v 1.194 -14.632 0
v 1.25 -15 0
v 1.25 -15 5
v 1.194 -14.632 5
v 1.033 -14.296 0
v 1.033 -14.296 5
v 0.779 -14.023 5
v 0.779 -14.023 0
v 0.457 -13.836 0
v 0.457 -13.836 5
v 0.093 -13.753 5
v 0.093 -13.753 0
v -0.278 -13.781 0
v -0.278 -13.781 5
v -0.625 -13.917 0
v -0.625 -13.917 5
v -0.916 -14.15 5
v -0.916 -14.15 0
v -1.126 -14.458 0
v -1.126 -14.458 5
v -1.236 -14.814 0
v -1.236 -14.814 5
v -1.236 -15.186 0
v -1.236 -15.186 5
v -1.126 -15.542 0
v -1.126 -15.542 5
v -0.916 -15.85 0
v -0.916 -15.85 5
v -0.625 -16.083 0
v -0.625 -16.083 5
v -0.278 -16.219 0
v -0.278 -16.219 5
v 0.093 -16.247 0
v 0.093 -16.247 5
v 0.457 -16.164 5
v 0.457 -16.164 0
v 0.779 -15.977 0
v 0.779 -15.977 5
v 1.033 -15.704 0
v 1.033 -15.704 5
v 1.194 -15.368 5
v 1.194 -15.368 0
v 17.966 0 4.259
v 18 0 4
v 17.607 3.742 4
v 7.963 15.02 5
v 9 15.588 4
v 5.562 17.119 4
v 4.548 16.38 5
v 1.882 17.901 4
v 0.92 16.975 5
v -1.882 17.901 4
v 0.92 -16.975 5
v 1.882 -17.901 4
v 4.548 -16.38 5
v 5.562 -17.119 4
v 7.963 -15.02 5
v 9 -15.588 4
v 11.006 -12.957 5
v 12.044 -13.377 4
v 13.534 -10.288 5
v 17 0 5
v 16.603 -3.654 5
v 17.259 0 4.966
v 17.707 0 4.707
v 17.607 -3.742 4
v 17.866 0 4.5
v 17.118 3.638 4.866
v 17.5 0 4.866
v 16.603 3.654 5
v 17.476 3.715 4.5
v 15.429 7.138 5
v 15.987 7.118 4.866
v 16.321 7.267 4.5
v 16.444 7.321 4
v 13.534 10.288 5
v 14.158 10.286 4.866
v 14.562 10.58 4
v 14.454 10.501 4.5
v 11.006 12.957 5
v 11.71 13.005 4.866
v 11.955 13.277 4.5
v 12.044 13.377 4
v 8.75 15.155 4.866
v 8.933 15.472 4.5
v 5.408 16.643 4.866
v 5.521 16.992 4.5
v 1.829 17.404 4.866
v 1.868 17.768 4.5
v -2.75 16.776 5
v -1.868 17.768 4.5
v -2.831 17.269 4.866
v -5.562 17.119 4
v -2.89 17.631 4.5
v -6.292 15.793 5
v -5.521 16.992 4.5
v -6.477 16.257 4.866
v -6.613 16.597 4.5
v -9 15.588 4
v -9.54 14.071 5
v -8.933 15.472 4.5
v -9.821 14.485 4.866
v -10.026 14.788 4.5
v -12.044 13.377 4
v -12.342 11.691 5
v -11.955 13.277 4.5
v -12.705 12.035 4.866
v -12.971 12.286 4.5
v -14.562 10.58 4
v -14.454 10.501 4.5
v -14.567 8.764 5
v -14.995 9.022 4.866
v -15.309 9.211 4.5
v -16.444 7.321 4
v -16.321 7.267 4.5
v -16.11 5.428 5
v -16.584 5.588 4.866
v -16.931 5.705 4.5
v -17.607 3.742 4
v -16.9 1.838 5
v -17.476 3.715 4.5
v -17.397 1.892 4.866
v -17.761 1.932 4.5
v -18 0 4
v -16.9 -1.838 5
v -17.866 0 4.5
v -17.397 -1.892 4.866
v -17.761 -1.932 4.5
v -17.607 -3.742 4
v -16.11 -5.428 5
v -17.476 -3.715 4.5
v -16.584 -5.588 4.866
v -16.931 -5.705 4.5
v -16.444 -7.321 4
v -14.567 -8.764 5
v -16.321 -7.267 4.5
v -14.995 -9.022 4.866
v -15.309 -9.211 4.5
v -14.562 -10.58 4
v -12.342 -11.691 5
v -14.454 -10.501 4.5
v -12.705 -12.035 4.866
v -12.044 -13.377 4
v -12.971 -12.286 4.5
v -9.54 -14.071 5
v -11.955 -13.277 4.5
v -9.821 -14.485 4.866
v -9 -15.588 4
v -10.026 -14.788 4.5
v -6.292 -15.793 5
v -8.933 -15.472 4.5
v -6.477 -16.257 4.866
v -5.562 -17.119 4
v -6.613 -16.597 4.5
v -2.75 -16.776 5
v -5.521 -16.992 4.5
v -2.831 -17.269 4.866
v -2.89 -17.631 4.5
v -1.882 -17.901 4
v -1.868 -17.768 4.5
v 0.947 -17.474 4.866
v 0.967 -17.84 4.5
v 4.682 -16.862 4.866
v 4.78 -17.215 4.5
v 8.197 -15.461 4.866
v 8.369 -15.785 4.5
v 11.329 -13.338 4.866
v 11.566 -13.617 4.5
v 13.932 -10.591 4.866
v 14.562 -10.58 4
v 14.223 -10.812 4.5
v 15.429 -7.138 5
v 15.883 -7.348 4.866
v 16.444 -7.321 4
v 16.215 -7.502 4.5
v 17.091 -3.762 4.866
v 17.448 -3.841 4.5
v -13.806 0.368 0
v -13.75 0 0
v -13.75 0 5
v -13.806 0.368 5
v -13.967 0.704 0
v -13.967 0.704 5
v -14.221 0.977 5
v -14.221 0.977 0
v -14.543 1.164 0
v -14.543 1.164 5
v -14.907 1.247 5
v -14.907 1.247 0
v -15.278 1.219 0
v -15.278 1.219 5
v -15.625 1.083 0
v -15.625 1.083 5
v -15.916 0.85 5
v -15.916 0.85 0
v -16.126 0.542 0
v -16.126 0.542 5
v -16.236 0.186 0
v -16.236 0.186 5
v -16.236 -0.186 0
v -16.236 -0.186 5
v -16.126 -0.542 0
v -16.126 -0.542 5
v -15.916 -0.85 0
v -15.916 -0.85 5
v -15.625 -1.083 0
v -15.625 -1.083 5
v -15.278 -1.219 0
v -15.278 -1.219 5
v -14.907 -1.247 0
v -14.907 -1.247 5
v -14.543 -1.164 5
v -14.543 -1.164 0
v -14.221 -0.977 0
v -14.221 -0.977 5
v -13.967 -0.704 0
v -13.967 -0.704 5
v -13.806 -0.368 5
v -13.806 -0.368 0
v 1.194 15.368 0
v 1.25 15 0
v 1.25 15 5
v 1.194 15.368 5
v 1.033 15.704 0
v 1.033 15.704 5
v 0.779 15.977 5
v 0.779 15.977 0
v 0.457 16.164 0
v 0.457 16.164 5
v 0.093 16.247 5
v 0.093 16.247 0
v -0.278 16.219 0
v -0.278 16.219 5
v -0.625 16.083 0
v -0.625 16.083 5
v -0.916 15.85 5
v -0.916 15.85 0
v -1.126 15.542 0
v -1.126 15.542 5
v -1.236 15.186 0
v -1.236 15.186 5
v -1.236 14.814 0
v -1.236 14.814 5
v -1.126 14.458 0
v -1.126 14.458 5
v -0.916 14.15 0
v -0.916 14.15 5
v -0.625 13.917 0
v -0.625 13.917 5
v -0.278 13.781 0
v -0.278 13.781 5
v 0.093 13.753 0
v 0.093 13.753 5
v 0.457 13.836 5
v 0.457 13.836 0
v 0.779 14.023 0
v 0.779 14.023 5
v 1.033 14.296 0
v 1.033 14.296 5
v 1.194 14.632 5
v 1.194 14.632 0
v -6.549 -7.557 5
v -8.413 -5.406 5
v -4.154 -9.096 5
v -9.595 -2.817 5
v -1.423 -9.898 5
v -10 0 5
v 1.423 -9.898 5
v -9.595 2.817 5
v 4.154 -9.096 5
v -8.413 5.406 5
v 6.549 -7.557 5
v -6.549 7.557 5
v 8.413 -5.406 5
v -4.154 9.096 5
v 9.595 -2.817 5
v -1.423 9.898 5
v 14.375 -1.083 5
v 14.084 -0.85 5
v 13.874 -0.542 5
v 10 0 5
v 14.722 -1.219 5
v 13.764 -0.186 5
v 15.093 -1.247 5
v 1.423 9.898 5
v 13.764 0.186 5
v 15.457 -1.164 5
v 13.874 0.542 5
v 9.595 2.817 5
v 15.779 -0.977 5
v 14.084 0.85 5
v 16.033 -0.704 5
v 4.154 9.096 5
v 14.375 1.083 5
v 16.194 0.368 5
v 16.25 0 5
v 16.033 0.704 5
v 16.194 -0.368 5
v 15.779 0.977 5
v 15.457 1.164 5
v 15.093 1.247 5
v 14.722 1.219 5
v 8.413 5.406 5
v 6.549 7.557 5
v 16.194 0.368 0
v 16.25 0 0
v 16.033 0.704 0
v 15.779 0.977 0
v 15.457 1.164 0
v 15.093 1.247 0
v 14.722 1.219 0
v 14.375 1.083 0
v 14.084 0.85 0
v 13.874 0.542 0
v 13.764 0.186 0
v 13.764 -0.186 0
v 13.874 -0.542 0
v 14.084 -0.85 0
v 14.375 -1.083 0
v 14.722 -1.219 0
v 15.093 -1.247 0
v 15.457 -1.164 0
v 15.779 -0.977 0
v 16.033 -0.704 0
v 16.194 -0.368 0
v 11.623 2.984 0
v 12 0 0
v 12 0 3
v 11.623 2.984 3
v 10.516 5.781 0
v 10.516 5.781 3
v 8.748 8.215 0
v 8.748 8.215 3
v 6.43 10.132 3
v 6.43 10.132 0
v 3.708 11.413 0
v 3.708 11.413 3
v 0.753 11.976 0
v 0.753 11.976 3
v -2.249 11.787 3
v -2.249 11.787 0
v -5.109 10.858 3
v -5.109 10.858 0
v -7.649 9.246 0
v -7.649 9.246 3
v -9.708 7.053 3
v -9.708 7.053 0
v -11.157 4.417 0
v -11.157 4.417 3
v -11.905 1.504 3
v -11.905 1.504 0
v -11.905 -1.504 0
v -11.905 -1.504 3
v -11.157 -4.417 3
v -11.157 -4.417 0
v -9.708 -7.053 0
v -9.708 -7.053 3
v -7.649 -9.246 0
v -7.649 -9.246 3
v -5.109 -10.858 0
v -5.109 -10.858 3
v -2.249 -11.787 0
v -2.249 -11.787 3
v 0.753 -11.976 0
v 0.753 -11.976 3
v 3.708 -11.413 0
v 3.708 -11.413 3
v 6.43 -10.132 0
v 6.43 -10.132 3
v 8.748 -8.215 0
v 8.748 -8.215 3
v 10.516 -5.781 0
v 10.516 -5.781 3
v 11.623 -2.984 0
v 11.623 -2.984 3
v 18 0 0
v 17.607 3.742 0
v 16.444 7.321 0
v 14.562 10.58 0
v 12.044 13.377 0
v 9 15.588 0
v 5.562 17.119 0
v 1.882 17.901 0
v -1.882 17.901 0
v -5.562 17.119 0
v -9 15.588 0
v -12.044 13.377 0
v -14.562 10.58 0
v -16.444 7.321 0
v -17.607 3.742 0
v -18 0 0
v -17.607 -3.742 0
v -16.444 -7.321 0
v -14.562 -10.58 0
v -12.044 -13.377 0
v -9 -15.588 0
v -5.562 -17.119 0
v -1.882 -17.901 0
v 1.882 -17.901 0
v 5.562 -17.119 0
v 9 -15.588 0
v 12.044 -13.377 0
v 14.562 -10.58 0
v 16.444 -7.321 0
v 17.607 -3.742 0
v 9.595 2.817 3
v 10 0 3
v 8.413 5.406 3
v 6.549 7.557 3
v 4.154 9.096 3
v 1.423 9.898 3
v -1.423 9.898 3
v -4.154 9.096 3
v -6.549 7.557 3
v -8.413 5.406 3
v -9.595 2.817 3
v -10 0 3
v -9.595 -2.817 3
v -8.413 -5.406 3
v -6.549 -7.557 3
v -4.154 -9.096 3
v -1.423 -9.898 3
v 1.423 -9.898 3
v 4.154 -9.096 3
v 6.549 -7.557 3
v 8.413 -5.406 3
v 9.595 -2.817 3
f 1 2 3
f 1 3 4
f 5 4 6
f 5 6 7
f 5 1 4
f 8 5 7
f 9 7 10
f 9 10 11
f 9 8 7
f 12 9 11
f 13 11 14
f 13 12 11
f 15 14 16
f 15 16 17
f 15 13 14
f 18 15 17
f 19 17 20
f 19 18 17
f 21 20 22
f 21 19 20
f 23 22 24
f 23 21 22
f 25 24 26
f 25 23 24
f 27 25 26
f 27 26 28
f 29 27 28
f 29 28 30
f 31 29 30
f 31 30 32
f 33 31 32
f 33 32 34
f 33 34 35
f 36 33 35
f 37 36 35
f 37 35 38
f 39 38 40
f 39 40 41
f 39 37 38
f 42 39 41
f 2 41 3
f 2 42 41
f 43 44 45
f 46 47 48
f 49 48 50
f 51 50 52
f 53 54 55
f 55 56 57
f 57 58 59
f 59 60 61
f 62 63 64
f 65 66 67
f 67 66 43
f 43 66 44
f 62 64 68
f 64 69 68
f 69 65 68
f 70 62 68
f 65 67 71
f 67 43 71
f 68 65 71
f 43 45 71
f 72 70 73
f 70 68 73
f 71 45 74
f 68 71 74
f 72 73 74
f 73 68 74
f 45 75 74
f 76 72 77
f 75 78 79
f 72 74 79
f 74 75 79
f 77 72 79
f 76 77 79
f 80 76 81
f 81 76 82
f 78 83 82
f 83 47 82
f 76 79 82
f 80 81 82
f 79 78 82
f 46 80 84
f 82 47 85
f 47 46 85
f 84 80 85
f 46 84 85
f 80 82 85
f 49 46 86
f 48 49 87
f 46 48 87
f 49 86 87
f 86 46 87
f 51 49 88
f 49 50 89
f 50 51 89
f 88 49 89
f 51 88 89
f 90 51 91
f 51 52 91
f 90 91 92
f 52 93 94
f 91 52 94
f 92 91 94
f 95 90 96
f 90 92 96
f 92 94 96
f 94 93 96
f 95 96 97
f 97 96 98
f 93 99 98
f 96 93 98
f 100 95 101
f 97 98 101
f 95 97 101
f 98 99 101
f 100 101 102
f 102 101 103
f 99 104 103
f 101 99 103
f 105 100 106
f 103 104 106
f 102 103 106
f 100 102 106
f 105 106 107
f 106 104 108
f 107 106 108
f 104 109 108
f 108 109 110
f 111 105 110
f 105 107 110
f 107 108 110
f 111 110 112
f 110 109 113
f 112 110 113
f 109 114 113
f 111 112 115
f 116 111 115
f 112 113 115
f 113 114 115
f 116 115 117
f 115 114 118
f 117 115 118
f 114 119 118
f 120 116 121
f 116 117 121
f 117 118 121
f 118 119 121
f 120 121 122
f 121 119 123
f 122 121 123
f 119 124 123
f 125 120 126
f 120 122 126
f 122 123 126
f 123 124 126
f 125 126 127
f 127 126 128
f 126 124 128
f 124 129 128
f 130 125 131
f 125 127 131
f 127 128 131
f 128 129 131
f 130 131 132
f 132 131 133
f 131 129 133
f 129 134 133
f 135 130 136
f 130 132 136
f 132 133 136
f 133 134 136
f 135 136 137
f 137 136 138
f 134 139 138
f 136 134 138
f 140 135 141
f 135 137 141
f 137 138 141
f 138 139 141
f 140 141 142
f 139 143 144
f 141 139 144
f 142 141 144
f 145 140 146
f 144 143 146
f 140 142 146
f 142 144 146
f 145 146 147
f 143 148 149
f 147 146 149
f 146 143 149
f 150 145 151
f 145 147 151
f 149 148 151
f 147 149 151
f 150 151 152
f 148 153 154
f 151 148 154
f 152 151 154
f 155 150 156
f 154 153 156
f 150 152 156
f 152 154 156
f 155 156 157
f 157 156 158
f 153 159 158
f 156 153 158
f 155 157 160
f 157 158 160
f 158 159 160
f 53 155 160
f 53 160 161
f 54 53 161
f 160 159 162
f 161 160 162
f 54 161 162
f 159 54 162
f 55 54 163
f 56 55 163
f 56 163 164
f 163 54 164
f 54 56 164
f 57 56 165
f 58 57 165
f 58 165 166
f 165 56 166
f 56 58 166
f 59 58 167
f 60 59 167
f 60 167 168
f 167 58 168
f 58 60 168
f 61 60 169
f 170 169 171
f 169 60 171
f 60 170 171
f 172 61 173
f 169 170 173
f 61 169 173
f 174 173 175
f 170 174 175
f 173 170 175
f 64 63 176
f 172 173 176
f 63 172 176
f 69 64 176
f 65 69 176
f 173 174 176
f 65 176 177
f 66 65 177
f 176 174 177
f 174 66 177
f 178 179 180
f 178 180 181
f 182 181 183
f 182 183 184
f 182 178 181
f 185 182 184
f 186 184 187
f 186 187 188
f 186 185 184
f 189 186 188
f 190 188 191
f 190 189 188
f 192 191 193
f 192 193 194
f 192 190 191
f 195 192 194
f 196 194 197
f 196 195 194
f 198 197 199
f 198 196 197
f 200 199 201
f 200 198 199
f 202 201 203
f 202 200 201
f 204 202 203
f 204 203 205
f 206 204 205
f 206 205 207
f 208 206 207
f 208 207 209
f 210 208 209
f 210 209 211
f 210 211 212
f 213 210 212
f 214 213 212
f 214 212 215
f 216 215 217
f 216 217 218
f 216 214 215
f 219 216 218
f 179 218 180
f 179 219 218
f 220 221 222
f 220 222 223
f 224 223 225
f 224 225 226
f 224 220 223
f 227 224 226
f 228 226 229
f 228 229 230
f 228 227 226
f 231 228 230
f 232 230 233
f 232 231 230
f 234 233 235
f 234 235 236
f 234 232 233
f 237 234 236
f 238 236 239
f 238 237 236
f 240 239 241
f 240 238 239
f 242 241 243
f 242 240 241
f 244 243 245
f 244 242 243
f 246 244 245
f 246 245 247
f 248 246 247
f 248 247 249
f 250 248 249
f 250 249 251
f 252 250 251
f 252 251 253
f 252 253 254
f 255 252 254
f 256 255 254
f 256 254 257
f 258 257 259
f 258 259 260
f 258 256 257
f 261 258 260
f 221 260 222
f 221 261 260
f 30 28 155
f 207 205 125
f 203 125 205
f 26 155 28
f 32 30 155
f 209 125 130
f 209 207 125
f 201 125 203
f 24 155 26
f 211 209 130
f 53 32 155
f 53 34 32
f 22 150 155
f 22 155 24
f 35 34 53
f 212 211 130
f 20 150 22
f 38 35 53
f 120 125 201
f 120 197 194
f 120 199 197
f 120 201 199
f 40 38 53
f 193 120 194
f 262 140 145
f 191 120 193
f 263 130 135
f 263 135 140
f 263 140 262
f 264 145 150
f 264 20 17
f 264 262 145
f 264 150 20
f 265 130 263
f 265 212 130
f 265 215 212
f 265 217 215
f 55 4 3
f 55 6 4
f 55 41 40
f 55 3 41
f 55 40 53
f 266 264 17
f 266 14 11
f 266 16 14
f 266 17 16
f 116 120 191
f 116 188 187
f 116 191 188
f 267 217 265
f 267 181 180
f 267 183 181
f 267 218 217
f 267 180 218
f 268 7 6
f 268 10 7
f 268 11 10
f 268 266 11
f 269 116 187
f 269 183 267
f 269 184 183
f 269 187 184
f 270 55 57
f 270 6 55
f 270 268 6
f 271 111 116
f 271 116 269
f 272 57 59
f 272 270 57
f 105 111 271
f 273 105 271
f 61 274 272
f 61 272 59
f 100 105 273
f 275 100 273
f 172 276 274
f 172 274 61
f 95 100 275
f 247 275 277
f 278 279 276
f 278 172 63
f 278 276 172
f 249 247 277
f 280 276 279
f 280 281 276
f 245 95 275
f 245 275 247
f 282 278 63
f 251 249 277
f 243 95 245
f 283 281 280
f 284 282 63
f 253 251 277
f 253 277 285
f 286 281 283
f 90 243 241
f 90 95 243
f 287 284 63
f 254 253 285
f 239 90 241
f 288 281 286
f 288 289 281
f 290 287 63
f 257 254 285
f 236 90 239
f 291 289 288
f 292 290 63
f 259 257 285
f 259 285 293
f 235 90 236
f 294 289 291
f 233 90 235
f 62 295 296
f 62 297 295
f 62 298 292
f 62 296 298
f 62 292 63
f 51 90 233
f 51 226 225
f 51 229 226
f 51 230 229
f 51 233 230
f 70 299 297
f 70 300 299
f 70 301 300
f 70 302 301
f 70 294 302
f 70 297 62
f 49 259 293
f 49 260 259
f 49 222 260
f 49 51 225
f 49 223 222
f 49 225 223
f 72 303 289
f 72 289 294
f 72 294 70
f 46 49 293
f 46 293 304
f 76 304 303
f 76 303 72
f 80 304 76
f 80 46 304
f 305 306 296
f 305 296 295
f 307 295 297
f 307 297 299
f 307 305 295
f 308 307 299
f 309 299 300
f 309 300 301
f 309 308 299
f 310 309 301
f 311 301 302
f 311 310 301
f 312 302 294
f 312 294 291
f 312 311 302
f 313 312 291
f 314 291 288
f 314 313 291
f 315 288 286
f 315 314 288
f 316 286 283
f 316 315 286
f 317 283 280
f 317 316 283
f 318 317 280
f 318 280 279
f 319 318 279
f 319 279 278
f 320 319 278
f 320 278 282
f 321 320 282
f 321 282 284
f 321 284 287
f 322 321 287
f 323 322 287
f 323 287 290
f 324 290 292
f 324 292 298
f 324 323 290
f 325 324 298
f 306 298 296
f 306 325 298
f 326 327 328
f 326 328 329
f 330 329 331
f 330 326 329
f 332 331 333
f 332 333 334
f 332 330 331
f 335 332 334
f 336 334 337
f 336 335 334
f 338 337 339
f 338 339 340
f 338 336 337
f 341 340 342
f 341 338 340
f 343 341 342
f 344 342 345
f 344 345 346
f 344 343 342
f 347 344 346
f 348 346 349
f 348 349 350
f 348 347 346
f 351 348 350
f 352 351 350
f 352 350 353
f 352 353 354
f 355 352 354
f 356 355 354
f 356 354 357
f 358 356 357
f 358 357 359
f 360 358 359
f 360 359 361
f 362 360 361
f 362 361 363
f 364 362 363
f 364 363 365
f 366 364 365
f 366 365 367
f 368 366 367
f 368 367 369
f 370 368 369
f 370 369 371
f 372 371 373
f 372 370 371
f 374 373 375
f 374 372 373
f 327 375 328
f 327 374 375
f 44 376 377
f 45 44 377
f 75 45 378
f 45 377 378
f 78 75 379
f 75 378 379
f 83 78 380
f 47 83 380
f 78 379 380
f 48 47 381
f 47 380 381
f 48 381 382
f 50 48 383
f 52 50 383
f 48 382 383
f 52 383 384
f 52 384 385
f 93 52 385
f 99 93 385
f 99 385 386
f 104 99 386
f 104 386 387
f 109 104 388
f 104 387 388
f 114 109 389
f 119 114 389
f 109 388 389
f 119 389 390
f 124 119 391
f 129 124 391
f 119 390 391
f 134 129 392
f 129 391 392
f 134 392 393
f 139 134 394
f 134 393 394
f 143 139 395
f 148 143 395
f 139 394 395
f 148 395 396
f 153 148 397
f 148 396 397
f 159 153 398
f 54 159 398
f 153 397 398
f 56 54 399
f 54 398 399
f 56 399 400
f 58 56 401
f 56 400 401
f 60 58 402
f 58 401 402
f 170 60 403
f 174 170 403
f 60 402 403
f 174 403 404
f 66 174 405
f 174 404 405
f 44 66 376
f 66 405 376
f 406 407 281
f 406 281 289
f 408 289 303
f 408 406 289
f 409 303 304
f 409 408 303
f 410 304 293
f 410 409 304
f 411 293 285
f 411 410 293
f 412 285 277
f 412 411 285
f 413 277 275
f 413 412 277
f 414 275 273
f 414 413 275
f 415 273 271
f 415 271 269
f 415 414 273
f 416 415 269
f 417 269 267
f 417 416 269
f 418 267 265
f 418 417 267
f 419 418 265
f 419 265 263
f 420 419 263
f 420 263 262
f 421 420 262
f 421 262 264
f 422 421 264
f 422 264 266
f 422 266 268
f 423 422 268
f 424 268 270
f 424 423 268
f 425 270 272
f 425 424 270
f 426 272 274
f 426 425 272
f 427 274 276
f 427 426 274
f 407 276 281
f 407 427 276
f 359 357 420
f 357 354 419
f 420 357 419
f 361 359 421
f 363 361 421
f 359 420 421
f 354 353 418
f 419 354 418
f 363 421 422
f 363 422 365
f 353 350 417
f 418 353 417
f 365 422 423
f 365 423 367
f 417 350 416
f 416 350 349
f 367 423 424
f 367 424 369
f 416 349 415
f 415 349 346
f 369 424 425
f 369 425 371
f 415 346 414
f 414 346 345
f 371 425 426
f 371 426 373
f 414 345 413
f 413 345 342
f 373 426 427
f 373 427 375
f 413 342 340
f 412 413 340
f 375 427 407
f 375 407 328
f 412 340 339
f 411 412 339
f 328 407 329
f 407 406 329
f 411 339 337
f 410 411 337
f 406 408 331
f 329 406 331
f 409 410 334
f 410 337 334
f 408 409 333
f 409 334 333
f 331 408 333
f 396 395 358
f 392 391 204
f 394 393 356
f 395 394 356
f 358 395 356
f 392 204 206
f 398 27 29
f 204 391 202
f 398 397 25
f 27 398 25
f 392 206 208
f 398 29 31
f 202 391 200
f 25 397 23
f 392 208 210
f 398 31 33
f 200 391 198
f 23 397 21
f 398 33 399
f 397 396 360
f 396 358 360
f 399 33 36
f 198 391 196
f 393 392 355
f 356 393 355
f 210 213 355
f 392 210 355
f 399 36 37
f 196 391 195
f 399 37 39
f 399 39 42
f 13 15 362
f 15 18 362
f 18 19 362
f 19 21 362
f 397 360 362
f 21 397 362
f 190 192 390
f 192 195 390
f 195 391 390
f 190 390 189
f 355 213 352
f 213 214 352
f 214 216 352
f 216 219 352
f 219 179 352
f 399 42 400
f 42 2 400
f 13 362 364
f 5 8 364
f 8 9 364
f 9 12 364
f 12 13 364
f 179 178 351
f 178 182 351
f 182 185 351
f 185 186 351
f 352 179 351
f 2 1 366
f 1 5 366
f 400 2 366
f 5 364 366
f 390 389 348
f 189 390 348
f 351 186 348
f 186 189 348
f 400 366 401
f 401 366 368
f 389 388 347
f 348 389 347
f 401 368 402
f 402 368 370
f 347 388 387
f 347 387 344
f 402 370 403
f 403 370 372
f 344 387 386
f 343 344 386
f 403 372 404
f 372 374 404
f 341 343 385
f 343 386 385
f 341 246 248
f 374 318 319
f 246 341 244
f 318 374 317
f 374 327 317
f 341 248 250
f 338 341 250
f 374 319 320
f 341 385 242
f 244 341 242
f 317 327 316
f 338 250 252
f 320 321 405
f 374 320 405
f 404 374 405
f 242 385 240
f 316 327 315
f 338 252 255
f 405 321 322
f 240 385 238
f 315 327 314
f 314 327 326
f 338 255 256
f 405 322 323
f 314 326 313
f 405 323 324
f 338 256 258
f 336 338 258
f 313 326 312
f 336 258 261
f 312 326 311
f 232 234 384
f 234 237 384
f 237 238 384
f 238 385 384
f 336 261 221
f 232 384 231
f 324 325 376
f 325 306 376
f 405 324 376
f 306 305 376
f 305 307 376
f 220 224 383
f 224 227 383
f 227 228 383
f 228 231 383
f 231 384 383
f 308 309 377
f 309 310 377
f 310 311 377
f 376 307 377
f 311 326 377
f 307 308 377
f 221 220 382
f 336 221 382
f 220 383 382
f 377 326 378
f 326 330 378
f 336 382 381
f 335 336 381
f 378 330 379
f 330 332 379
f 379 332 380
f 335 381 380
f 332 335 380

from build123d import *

# Parameters (mm, degrees)
SKETCH_1_R      = 18
SKETCH_1_R_2    = 12
SKETCH_1_R_3    = 1.25
EXTRUDE_1_DEPTH = 5
EXTRUDE_START   = -2
SKETCH_2_R      = 12
SKETCH_2_R_2    = 10
EXTRUDE_2_DEPTH = 2
FILLET_1_R      = 1


with BuildPart() as part:
    # 草图1 → 凸台-拉伸1 (new body)
    with BuildSketch(Plane.XY):
        Circle(SKETCH_1_R)
        Circle(SKETCH_1_R_2, mode=Mode.SUBTRACT)
        with Locations((0, 15)):
            Circle(SKETCH_1_R_3, mode=Mode.SUBTRACT)
        with Locations((-15, 0)):
            Circle(SKETCH_1_R_3, mode=Mode.SUBTRACT)
        with Locations((0, -15)):
            Circle(SKETCH_1_R_3, mode=Mode.SUBTRACT)
        with Locations((15, 0)):
            Circle(SKETCH_1_R_3, mode=Mode.SUBTRACT)
    extrude(amount=EXTRUDE_1_DEPTH)

    # 草图2 → 凸台-拉伸2 (add)
    with BuildSketch(Plane.XY.offset(5).offset(EXTRUDE_START)):
        Circle(SKETCH_2_R)
        Circle(SKETCH_2_R_2, mode=Mode.SUBTRACT)
    extrude(amount=EXTRUDE_2_DEPTH)

    # 圆角1
    fillet_1_edges = [part.edges().sort_by_distance(p)[0] for p in [
        (-18, 0, 5),
    ]]
    fillet(fillet_1_edges, radius=FILLET_1_R)


solid = part.part
